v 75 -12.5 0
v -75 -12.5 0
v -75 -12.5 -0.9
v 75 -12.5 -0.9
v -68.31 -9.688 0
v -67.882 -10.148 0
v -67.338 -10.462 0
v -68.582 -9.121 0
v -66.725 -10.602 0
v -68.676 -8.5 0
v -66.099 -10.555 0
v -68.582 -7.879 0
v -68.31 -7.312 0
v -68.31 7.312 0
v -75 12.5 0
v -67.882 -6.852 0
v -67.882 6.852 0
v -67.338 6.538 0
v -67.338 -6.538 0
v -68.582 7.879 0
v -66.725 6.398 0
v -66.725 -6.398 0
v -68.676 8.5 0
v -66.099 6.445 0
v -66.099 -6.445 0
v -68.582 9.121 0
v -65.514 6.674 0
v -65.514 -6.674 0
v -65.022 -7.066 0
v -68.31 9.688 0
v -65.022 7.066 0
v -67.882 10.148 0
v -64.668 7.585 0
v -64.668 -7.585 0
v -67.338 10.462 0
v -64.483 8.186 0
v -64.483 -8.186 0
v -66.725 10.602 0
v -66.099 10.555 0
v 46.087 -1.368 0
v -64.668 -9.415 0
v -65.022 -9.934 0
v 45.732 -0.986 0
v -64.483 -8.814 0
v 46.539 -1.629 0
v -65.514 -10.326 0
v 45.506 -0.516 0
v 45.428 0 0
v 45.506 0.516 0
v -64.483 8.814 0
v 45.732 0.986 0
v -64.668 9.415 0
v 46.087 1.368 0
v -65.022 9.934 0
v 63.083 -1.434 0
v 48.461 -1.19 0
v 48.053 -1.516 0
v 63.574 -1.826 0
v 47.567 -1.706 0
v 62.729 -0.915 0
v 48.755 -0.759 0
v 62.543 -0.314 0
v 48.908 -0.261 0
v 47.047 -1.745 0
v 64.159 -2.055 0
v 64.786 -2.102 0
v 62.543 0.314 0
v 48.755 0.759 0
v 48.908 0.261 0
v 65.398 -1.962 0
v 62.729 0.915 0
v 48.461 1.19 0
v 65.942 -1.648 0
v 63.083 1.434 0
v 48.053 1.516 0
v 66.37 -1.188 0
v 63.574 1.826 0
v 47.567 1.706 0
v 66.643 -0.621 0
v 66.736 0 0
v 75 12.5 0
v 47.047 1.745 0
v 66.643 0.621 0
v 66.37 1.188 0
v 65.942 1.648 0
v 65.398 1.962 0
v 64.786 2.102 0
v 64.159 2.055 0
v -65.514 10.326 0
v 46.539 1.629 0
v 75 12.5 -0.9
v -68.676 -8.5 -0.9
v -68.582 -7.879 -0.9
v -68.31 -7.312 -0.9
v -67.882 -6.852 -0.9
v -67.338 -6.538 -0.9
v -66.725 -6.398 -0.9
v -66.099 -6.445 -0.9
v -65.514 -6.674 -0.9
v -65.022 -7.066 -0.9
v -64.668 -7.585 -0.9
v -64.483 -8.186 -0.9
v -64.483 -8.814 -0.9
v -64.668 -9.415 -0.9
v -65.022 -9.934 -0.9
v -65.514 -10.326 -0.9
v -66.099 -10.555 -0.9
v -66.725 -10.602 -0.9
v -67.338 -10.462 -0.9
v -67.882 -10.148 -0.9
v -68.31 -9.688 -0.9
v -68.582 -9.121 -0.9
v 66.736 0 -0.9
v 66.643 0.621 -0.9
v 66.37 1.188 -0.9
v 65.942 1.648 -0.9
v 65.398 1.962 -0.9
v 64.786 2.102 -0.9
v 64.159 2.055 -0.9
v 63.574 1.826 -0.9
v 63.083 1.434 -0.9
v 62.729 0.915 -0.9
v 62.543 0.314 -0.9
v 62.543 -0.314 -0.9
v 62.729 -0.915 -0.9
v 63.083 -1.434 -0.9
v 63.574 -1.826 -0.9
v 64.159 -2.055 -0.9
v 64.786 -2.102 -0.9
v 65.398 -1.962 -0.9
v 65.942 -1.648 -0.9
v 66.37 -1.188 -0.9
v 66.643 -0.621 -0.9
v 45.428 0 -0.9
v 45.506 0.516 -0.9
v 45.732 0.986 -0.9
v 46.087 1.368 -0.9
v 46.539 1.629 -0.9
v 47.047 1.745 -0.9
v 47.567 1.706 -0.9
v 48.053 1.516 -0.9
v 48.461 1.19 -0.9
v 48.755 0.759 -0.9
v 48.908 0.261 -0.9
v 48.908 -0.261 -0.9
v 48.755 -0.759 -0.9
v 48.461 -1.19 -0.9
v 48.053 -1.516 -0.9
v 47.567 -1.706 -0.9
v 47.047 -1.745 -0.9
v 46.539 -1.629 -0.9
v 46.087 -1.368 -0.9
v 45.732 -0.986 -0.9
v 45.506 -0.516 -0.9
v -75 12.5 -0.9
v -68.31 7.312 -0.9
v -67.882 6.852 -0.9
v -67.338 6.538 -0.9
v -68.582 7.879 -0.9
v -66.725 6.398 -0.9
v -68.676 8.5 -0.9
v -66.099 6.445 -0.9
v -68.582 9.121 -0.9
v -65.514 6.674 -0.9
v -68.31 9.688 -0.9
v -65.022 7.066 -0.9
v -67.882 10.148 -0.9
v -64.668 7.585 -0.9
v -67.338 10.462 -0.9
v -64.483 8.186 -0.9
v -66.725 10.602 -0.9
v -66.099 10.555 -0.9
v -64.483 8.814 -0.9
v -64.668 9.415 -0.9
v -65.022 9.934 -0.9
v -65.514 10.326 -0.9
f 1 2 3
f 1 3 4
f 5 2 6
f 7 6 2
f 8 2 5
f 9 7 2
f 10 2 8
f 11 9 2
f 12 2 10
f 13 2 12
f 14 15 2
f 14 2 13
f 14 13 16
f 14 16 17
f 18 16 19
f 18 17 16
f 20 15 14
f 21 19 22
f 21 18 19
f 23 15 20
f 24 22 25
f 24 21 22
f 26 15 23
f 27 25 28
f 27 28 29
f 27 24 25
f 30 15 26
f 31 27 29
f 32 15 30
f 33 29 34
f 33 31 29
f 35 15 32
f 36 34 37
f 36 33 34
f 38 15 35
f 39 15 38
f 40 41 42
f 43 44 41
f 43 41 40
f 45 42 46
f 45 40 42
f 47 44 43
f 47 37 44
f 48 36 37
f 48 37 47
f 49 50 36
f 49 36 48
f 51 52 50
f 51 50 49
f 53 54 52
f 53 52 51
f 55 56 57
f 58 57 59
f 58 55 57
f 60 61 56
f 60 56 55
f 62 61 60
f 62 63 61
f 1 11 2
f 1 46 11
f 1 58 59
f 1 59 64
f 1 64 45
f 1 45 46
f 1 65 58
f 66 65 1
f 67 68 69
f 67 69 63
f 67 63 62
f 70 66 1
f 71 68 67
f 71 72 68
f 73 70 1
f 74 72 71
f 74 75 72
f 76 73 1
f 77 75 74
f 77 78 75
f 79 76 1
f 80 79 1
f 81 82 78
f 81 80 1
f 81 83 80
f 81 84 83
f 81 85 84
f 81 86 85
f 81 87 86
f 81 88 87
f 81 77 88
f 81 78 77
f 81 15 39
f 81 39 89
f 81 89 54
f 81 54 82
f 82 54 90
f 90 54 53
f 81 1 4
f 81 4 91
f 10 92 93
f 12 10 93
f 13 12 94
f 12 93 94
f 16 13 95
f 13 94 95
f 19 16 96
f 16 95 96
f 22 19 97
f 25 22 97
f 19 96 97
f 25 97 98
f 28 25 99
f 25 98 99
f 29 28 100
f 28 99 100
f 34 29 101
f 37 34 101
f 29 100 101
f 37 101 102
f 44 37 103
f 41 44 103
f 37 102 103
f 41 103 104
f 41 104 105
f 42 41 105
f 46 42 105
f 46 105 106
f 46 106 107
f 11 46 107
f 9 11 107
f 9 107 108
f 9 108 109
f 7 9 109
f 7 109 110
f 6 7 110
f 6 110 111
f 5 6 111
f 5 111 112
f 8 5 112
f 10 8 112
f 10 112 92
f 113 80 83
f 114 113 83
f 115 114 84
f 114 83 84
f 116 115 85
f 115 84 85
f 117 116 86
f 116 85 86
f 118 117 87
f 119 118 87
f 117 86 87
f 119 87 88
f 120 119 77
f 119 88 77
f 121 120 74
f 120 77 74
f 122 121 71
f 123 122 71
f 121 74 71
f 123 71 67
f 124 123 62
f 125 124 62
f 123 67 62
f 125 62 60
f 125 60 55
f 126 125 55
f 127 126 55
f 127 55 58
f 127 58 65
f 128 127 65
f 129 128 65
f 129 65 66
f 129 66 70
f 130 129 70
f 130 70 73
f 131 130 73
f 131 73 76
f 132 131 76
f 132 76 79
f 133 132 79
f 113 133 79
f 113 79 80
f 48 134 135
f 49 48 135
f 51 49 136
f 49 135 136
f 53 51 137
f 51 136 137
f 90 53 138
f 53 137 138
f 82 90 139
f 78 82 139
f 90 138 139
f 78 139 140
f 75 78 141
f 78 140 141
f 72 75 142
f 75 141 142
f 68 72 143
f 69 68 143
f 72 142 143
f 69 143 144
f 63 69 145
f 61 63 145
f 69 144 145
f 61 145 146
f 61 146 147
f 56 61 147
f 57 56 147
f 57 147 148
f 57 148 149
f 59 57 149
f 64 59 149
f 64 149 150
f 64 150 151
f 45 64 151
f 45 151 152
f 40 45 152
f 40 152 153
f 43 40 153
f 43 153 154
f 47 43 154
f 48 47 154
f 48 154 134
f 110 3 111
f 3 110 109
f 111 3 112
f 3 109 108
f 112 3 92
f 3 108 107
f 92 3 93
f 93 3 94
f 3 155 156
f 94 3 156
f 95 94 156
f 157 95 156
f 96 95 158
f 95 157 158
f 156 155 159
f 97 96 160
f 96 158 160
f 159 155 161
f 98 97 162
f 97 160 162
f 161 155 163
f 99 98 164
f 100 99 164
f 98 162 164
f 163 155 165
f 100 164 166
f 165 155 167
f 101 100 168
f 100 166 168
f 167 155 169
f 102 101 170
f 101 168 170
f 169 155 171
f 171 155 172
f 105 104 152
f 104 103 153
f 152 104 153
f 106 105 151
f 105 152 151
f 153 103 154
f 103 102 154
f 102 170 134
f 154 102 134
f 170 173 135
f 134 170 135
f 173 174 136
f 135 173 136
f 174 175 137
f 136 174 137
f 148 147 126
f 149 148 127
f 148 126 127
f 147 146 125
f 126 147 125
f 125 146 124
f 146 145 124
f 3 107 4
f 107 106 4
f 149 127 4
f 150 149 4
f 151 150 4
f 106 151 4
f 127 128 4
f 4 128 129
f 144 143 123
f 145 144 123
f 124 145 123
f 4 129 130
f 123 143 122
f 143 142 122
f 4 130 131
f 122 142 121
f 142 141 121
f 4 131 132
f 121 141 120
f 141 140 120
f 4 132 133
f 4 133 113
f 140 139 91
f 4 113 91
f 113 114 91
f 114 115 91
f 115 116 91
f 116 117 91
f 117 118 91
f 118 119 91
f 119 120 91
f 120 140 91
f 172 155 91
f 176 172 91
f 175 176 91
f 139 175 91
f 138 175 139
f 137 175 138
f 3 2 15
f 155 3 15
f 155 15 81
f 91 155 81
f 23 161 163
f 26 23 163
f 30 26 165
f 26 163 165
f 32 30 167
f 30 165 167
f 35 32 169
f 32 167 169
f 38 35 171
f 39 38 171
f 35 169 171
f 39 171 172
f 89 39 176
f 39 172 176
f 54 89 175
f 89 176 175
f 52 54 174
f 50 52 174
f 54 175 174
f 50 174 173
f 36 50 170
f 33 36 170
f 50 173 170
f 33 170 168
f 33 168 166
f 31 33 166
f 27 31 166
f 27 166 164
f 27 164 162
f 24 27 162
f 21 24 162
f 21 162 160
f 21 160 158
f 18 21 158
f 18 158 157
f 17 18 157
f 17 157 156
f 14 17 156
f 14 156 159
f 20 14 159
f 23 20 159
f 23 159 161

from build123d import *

# Parameters (mm, degrees)
SKETCH2_W                   = 150
SKETCH2_H                   = 25
BASE_FLANGE1_DEPTH          = 0.9
F_19_0_166_DIAMETER_SLOT1_D = 4.2164
F_19_0_166_DIAMETER_SLOT2_D = 4.2164
F_1_0MM_DOWEL_SLOT1_D       = 3.5


# Sheet-metal steps are written as plain solids
with BuildPart() as part:
    # Sketch2 → Base-Flange1 (new body)
    with BuildSketch(Plane.XY):
        Rectangle(SKETCH2_W, SKETCH2_H)
    extrude(amount=-BASE_FLANGE1_DEPTH)

    # #19 (0.166) Diameter Slot1 (through all)
    with Locations(Plane(origin=(0, 0, -0.9), x_dir=(-1, 0, 0), z_dir=(0, 0, -1))):
        with Locations((-64.628032866, 0)):
            Hole(F_19_0_166_DIAMETER_SLOT1_D / 2)

    # #19 (0.166) Diameter Slot2 (through all)
    with Locations(Plane.XY):
        with Locations((-66.567919304, 8.5), (-66.567919304, -8.5)):
            Hole(F_19_0_166_DIAMETER_SLOT2_D / 2)

    # Ø1.0mm Dowel Slot1 (through all)
    with Locations(Plane.XY):
        with Locations((47.178032866, 0)):
            Hole(F_1_0MM_DOWEL_SLOT1_D / 2)


solid = part.part
